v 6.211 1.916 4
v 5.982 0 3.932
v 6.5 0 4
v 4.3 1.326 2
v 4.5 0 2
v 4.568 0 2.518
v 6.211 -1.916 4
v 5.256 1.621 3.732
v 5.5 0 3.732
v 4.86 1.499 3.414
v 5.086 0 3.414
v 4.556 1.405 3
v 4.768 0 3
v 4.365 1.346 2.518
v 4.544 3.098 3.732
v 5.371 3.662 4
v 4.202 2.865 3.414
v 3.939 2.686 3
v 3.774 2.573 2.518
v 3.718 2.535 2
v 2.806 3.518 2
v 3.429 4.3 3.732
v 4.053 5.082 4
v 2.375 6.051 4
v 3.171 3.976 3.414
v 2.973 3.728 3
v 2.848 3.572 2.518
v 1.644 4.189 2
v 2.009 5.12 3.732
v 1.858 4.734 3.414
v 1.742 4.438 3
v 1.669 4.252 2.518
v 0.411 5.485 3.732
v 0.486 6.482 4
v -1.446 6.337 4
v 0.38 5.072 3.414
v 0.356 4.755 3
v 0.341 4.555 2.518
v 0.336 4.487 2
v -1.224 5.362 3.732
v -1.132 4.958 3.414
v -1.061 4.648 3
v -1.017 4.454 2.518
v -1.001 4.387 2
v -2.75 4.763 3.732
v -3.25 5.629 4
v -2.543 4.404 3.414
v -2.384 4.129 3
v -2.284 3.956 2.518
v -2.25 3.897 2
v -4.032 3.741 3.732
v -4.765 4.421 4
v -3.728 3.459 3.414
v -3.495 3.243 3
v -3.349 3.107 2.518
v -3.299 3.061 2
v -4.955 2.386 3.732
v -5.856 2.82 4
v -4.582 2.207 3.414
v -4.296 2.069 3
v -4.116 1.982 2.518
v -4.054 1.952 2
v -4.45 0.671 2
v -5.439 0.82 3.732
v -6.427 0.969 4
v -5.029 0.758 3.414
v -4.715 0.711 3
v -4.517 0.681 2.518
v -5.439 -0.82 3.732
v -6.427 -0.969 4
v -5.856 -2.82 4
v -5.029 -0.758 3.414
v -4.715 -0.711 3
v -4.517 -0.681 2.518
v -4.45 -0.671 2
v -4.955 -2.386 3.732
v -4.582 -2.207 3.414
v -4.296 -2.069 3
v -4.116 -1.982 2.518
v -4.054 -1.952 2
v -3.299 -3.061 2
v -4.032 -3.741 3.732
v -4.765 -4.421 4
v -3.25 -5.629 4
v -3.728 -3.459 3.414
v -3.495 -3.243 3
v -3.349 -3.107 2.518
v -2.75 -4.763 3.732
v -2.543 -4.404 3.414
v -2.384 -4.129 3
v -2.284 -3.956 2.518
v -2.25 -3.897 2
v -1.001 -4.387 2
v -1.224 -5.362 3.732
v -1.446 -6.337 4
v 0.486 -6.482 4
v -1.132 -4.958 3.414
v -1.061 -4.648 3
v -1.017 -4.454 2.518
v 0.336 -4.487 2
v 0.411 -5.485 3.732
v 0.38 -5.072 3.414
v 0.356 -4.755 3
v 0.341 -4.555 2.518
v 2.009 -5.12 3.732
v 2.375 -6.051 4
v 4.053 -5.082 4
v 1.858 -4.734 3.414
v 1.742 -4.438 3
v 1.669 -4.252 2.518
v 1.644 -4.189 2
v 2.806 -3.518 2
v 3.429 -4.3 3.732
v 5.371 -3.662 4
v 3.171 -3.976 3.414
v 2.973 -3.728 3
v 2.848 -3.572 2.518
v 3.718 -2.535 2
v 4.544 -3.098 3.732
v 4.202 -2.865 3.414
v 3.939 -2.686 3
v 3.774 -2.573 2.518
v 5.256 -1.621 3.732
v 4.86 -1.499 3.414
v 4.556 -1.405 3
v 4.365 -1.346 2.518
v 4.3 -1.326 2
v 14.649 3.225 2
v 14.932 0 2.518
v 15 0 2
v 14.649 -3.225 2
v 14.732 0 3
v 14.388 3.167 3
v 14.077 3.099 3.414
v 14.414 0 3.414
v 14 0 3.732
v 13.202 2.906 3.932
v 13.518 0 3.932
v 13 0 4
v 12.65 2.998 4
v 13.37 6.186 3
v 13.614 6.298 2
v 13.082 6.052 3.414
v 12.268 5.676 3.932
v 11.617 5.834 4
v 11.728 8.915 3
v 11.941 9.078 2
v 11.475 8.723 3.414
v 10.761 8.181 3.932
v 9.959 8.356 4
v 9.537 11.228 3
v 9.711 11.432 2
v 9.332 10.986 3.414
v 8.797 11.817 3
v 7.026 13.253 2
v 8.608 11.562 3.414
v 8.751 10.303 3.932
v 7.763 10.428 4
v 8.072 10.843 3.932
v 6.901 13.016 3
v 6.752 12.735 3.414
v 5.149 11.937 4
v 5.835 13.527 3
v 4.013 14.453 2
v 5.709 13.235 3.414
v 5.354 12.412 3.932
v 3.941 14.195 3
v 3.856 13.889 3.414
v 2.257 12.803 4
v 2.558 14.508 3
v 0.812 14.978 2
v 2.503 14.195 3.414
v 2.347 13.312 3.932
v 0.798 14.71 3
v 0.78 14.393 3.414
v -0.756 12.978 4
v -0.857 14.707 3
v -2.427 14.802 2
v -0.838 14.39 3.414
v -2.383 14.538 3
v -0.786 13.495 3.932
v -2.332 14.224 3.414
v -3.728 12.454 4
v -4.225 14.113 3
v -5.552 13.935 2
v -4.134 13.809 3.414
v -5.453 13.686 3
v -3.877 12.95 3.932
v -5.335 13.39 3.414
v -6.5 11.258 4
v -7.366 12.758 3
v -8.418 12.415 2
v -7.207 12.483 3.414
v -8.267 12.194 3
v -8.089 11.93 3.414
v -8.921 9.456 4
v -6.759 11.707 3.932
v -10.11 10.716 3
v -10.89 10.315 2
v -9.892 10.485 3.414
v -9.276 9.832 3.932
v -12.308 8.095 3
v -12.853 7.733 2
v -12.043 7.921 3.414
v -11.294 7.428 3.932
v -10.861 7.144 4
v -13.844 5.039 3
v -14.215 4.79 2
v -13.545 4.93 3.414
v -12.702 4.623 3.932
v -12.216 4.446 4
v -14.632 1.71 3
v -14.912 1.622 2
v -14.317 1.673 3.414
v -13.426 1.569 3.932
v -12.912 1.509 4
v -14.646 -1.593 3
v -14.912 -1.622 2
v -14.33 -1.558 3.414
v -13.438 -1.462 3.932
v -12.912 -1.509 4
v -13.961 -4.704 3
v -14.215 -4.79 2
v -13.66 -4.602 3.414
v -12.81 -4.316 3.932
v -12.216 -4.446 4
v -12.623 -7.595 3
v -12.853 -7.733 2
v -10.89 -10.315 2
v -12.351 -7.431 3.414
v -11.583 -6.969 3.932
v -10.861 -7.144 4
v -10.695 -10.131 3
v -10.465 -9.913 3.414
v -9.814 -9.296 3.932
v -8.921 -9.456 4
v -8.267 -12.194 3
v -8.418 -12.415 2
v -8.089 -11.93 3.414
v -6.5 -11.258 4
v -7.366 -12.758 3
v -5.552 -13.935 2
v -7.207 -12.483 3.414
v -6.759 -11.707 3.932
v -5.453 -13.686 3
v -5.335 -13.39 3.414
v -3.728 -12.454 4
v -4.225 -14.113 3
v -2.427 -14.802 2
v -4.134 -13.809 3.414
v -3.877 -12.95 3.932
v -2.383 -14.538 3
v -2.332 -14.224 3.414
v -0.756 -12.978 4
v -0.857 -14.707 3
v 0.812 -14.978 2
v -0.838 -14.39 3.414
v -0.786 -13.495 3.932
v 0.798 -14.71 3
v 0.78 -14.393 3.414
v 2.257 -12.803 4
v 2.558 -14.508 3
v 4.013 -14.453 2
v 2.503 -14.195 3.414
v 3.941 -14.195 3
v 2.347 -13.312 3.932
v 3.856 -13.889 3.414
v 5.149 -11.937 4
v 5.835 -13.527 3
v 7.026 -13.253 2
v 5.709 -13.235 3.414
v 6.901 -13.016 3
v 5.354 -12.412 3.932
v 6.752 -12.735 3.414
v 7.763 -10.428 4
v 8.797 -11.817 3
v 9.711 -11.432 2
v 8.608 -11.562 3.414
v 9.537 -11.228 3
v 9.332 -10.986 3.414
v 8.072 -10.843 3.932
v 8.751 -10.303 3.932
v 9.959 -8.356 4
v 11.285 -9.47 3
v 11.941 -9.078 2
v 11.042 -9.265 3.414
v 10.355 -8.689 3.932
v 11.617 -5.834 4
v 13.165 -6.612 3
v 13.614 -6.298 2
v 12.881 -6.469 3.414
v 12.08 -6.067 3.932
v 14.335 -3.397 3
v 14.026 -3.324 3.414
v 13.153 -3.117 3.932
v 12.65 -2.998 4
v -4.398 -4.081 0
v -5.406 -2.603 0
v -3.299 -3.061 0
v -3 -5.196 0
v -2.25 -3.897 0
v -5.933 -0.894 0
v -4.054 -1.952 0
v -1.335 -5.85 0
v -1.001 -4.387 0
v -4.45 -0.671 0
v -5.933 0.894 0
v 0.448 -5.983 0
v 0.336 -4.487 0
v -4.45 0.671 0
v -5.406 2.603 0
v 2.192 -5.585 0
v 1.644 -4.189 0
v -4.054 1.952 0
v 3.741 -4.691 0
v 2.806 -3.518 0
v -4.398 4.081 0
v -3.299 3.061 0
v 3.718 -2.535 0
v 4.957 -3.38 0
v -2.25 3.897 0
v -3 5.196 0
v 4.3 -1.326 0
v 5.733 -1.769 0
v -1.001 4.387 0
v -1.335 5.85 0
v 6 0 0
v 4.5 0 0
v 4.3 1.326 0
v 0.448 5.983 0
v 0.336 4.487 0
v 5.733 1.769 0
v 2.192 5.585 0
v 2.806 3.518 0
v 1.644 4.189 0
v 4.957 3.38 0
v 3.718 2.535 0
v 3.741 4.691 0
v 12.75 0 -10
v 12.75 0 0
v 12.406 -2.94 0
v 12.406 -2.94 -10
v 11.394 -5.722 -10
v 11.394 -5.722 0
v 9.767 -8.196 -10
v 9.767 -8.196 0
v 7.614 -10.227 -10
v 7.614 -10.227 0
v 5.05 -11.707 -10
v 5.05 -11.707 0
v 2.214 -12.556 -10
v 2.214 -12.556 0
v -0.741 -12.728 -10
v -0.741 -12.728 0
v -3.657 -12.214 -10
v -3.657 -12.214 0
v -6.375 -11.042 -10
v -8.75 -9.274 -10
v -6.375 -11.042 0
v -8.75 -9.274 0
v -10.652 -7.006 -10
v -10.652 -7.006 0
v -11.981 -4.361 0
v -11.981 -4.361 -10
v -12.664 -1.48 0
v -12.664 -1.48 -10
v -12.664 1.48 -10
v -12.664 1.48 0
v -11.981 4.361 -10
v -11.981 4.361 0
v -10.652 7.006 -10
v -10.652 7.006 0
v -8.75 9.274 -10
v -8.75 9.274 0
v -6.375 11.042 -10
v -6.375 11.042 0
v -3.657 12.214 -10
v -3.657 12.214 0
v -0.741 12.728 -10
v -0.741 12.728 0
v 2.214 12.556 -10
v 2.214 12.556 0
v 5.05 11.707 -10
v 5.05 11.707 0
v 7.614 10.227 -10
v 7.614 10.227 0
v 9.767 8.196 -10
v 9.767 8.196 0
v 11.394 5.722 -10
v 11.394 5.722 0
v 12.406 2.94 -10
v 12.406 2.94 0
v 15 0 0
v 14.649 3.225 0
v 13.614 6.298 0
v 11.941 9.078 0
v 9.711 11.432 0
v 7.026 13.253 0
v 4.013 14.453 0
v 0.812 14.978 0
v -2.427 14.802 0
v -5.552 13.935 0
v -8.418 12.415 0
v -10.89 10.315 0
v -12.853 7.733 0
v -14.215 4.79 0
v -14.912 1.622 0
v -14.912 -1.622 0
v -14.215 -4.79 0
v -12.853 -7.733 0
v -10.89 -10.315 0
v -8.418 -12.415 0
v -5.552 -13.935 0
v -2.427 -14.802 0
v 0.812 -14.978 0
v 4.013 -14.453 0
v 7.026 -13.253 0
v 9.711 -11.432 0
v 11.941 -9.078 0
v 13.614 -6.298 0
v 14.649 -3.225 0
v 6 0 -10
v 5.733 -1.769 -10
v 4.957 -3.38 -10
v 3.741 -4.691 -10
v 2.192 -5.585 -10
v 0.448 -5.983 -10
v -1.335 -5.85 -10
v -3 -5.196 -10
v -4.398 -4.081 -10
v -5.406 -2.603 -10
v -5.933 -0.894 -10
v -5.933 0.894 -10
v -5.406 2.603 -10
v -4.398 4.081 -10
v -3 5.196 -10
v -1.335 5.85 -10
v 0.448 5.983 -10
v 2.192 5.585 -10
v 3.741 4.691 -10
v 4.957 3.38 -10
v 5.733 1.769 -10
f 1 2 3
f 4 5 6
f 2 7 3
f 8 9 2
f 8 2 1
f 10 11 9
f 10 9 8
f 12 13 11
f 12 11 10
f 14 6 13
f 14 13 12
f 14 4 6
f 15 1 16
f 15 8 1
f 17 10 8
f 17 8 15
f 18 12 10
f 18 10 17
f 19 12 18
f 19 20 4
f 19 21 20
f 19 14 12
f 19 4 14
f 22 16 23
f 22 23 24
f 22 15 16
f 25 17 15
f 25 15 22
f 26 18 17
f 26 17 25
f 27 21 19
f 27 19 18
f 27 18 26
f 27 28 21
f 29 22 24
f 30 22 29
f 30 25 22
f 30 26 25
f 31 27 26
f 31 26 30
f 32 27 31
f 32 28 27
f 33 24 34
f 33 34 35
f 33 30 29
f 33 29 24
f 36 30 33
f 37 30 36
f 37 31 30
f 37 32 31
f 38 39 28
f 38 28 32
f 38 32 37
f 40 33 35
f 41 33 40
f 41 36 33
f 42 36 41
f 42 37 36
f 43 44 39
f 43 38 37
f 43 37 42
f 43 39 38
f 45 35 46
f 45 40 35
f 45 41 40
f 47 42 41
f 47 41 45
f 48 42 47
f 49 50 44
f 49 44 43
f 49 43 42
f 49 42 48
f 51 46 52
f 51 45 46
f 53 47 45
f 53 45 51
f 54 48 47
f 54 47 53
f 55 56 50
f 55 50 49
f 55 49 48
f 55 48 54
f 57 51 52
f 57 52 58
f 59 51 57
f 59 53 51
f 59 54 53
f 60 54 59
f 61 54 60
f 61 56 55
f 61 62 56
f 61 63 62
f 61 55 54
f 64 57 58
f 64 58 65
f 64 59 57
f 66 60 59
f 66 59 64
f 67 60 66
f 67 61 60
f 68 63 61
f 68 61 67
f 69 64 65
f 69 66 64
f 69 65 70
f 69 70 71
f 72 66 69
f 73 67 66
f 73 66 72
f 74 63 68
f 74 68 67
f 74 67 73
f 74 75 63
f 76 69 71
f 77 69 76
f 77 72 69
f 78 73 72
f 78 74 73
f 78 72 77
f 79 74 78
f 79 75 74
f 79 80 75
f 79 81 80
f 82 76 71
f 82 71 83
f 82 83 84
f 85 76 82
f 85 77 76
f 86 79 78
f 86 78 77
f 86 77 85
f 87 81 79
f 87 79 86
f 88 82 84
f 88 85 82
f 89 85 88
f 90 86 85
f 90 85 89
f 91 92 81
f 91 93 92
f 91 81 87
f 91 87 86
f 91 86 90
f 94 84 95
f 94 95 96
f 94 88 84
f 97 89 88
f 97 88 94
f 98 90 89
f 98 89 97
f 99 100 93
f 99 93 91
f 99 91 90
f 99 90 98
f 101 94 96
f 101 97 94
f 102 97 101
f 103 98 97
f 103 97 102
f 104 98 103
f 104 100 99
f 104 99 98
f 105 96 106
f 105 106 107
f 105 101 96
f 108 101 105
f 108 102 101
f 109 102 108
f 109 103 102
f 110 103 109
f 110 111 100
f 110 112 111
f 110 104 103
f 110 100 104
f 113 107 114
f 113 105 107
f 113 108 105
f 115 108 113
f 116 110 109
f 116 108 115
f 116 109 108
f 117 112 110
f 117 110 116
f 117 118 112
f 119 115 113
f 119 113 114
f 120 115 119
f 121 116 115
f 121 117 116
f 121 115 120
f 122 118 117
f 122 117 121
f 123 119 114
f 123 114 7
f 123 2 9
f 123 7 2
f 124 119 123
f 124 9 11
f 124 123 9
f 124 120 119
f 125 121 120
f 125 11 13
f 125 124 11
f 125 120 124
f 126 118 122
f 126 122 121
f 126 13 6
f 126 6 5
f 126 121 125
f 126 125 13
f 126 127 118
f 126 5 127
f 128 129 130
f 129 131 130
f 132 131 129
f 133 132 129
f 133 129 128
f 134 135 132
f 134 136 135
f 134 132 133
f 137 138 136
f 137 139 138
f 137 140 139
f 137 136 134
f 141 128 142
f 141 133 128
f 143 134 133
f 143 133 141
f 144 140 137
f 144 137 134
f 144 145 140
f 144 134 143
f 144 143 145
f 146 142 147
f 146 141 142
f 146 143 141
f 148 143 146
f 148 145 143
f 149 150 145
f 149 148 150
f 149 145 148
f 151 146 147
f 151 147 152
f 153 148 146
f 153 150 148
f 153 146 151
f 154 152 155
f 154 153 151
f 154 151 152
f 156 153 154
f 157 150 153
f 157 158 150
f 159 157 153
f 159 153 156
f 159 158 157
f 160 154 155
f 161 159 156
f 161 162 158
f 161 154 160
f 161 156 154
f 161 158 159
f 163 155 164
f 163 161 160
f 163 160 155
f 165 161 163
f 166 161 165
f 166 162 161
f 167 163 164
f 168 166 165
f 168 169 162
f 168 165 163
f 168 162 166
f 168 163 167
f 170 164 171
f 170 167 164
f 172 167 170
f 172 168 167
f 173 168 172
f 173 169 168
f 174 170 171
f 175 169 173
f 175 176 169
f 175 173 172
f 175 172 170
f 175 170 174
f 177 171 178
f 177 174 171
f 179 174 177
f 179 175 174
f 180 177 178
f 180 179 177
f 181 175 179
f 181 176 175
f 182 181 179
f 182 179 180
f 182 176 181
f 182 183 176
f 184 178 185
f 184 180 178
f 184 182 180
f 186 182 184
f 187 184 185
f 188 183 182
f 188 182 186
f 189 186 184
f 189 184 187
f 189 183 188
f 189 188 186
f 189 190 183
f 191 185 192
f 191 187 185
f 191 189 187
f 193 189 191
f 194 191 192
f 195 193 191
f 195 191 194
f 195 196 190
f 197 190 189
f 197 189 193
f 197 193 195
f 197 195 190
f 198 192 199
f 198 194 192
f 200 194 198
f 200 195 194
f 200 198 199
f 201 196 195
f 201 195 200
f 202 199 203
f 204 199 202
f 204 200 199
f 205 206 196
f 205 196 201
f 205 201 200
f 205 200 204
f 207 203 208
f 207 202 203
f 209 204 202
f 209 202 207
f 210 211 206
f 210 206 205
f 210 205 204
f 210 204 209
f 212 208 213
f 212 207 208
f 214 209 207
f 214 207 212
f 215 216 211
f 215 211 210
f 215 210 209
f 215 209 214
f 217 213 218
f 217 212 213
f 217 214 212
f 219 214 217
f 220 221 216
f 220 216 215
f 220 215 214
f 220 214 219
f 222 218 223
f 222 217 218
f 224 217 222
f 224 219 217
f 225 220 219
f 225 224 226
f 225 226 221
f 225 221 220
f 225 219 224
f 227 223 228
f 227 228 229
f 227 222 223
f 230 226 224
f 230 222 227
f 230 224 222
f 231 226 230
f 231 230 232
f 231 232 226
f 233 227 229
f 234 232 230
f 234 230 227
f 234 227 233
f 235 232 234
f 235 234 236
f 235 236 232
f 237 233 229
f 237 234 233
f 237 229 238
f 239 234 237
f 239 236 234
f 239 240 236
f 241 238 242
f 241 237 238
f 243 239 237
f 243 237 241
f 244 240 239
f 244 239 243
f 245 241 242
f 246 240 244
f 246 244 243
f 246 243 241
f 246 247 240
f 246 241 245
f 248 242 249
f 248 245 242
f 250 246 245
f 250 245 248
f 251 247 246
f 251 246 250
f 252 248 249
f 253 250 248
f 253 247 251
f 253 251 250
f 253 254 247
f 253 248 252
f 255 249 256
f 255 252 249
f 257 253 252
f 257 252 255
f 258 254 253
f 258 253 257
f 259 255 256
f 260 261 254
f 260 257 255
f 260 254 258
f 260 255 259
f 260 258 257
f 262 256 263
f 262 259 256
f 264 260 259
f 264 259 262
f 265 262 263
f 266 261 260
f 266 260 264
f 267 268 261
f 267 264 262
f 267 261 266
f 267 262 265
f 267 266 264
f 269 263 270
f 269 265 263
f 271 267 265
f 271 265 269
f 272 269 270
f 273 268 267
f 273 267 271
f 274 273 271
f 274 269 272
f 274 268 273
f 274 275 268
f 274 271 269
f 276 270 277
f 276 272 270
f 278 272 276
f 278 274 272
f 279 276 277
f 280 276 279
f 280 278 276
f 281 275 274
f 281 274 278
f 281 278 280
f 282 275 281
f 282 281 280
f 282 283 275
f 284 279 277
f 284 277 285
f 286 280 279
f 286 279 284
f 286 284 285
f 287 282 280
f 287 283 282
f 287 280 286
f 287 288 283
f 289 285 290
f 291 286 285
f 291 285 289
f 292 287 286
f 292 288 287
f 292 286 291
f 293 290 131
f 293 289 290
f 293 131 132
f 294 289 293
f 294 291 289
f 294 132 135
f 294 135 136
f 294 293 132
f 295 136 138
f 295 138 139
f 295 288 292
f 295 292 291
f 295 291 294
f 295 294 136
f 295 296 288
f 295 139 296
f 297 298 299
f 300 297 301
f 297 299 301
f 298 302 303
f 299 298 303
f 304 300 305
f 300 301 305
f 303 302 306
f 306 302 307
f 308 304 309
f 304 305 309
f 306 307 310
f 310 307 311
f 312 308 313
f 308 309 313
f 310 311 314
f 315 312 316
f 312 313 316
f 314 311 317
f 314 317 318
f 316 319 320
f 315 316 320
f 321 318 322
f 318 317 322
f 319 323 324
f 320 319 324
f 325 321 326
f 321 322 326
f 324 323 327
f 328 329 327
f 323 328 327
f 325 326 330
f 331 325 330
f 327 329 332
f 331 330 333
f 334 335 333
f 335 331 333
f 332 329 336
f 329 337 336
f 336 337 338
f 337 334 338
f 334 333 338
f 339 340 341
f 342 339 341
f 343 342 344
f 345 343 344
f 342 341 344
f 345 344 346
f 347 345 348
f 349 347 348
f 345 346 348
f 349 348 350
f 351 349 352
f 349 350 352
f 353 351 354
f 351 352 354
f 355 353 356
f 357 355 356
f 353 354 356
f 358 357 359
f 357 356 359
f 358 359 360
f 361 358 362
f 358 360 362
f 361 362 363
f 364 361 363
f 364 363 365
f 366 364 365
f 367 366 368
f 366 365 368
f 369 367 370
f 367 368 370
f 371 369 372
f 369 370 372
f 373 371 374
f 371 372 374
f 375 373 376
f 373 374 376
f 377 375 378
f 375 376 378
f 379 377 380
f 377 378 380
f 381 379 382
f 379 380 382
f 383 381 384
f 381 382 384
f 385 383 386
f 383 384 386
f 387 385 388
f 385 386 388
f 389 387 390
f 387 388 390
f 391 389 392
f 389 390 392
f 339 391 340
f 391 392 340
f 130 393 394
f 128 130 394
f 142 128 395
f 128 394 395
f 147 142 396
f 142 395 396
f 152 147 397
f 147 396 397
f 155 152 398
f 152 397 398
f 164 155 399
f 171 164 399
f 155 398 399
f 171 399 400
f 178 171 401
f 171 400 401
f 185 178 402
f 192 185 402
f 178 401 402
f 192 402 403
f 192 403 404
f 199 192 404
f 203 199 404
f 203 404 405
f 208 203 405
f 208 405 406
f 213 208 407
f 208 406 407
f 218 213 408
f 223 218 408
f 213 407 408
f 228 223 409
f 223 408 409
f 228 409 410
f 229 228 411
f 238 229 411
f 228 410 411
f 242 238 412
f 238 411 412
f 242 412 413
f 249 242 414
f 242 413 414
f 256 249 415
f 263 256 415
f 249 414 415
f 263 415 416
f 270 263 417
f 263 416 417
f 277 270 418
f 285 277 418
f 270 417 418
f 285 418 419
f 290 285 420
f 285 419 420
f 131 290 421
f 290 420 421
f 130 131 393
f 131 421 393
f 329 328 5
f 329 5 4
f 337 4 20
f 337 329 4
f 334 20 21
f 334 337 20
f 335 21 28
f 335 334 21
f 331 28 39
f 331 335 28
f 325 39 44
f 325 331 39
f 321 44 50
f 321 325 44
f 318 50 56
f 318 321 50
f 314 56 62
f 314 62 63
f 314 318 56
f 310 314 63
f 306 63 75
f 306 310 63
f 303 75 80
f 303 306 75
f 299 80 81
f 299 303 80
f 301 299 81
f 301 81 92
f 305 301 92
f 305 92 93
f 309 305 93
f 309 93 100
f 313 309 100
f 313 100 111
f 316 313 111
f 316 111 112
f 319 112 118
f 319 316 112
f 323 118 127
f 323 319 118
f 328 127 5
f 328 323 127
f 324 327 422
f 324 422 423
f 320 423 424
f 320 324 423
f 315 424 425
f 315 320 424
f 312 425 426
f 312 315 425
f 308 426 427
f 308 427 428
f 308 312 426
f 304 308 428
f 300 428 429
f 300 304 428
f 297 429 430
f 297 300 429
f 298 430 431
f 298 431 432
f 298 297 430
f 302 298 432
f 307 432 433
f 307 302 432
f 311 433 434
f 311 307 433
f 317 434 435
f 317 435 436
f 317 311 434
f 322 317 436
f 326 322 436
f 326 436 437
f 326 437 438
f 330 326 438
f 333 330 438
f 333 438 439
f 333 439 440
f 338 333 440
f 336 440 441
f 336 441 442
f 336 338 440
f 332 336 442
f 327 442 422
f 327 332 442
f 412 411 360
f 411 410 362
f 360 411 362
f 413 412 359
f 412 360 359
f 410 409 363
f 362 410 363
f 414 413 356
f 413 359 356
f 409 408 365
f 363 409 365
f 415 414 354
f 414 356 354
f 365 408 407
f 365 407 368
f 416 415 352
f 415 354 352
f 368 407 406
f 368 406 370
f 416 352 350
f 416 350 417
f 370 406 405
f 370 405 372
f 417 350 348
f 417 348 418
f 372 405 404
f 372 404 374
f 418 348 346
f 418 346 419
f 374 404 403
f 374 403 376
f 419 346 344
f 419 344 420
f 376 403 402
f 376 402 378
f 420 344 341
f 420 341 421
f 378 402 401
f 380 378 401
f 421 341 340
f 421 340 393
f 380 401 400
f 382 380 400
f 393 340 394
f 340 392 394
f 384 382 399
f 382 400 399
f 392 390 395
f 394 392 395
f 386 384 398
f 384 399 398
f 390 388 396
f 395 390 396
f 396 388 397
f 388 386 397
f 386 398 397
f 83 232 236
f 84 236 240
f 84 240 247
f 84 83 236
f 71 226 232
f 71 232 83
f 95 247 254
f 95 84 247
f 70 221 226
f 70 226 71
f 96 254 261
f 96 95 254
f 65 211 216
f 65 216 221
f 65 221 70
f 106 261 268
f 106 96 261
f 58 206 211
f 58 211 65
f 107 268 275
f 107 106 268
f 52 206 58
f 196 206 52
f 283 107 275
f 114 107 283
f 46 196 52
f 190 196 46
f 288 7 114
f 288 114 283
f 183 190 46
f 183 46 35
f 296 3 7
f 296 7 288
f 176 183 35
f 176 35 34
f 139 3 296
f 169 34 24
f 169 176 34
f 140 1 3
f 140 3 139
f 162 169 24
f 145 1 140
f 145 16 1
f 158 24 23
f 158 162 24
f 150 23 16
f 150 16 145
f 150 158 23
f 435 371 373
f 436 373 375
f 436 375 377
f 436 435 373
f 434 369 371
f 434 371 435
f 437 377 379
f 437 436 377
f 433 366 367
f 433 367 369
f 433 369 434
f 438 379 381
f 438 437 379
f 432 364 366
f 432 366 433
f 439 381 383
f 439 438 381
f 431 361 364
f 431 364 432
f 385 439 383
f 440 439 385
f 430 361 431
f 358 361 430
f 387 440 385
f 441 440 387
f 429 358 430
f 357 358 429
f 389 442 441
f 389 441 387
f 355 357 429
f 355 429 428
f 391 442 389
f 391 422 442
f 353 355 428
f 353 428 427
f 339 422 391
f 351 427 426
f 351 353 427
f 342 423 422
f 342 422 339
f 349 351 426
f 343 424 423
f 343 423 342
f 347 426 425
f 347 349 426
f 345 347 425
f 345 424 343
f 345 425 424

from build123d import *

# Parameters (mm, degrees)
F0_R     = 15
F0_R_2   = 4.5
F1_DEPTH = 4
F2_R     = 12.75
F2_R_2   = 6
F3_DEPTH = 10
F4_R     = 2


with BuildPart() as f1:
    # F0 (on Top) → F1 (new body)
    with BuildSketch(Plane.XY):
        Circle(F0_R)
        Circle(F0_R_2, mode=Mode.SUBTRACT)
    extrude(amount=F1_DEPTH)

    # F2 (on face) → F3 (join)
    with BuildSketch(Plane(origin=(0, 0, 0), x_dir=(1, 0, 0), z_dir=(0, 0, -1))):
        Circle(F2_R)
        Circle(F2_R_2, mode=Mode.SUBTRACT)
    extrude(amount=F3_DEPTH)

    # F4
    f4_edges = [f1.edges().sort_by_distance(p)[0] for p in [
        (-15, 0, 4),
        (-4.5, 0, 4),
    ]]
    fillet(f4_edges, radius=F4_R)


solid = f1.part
